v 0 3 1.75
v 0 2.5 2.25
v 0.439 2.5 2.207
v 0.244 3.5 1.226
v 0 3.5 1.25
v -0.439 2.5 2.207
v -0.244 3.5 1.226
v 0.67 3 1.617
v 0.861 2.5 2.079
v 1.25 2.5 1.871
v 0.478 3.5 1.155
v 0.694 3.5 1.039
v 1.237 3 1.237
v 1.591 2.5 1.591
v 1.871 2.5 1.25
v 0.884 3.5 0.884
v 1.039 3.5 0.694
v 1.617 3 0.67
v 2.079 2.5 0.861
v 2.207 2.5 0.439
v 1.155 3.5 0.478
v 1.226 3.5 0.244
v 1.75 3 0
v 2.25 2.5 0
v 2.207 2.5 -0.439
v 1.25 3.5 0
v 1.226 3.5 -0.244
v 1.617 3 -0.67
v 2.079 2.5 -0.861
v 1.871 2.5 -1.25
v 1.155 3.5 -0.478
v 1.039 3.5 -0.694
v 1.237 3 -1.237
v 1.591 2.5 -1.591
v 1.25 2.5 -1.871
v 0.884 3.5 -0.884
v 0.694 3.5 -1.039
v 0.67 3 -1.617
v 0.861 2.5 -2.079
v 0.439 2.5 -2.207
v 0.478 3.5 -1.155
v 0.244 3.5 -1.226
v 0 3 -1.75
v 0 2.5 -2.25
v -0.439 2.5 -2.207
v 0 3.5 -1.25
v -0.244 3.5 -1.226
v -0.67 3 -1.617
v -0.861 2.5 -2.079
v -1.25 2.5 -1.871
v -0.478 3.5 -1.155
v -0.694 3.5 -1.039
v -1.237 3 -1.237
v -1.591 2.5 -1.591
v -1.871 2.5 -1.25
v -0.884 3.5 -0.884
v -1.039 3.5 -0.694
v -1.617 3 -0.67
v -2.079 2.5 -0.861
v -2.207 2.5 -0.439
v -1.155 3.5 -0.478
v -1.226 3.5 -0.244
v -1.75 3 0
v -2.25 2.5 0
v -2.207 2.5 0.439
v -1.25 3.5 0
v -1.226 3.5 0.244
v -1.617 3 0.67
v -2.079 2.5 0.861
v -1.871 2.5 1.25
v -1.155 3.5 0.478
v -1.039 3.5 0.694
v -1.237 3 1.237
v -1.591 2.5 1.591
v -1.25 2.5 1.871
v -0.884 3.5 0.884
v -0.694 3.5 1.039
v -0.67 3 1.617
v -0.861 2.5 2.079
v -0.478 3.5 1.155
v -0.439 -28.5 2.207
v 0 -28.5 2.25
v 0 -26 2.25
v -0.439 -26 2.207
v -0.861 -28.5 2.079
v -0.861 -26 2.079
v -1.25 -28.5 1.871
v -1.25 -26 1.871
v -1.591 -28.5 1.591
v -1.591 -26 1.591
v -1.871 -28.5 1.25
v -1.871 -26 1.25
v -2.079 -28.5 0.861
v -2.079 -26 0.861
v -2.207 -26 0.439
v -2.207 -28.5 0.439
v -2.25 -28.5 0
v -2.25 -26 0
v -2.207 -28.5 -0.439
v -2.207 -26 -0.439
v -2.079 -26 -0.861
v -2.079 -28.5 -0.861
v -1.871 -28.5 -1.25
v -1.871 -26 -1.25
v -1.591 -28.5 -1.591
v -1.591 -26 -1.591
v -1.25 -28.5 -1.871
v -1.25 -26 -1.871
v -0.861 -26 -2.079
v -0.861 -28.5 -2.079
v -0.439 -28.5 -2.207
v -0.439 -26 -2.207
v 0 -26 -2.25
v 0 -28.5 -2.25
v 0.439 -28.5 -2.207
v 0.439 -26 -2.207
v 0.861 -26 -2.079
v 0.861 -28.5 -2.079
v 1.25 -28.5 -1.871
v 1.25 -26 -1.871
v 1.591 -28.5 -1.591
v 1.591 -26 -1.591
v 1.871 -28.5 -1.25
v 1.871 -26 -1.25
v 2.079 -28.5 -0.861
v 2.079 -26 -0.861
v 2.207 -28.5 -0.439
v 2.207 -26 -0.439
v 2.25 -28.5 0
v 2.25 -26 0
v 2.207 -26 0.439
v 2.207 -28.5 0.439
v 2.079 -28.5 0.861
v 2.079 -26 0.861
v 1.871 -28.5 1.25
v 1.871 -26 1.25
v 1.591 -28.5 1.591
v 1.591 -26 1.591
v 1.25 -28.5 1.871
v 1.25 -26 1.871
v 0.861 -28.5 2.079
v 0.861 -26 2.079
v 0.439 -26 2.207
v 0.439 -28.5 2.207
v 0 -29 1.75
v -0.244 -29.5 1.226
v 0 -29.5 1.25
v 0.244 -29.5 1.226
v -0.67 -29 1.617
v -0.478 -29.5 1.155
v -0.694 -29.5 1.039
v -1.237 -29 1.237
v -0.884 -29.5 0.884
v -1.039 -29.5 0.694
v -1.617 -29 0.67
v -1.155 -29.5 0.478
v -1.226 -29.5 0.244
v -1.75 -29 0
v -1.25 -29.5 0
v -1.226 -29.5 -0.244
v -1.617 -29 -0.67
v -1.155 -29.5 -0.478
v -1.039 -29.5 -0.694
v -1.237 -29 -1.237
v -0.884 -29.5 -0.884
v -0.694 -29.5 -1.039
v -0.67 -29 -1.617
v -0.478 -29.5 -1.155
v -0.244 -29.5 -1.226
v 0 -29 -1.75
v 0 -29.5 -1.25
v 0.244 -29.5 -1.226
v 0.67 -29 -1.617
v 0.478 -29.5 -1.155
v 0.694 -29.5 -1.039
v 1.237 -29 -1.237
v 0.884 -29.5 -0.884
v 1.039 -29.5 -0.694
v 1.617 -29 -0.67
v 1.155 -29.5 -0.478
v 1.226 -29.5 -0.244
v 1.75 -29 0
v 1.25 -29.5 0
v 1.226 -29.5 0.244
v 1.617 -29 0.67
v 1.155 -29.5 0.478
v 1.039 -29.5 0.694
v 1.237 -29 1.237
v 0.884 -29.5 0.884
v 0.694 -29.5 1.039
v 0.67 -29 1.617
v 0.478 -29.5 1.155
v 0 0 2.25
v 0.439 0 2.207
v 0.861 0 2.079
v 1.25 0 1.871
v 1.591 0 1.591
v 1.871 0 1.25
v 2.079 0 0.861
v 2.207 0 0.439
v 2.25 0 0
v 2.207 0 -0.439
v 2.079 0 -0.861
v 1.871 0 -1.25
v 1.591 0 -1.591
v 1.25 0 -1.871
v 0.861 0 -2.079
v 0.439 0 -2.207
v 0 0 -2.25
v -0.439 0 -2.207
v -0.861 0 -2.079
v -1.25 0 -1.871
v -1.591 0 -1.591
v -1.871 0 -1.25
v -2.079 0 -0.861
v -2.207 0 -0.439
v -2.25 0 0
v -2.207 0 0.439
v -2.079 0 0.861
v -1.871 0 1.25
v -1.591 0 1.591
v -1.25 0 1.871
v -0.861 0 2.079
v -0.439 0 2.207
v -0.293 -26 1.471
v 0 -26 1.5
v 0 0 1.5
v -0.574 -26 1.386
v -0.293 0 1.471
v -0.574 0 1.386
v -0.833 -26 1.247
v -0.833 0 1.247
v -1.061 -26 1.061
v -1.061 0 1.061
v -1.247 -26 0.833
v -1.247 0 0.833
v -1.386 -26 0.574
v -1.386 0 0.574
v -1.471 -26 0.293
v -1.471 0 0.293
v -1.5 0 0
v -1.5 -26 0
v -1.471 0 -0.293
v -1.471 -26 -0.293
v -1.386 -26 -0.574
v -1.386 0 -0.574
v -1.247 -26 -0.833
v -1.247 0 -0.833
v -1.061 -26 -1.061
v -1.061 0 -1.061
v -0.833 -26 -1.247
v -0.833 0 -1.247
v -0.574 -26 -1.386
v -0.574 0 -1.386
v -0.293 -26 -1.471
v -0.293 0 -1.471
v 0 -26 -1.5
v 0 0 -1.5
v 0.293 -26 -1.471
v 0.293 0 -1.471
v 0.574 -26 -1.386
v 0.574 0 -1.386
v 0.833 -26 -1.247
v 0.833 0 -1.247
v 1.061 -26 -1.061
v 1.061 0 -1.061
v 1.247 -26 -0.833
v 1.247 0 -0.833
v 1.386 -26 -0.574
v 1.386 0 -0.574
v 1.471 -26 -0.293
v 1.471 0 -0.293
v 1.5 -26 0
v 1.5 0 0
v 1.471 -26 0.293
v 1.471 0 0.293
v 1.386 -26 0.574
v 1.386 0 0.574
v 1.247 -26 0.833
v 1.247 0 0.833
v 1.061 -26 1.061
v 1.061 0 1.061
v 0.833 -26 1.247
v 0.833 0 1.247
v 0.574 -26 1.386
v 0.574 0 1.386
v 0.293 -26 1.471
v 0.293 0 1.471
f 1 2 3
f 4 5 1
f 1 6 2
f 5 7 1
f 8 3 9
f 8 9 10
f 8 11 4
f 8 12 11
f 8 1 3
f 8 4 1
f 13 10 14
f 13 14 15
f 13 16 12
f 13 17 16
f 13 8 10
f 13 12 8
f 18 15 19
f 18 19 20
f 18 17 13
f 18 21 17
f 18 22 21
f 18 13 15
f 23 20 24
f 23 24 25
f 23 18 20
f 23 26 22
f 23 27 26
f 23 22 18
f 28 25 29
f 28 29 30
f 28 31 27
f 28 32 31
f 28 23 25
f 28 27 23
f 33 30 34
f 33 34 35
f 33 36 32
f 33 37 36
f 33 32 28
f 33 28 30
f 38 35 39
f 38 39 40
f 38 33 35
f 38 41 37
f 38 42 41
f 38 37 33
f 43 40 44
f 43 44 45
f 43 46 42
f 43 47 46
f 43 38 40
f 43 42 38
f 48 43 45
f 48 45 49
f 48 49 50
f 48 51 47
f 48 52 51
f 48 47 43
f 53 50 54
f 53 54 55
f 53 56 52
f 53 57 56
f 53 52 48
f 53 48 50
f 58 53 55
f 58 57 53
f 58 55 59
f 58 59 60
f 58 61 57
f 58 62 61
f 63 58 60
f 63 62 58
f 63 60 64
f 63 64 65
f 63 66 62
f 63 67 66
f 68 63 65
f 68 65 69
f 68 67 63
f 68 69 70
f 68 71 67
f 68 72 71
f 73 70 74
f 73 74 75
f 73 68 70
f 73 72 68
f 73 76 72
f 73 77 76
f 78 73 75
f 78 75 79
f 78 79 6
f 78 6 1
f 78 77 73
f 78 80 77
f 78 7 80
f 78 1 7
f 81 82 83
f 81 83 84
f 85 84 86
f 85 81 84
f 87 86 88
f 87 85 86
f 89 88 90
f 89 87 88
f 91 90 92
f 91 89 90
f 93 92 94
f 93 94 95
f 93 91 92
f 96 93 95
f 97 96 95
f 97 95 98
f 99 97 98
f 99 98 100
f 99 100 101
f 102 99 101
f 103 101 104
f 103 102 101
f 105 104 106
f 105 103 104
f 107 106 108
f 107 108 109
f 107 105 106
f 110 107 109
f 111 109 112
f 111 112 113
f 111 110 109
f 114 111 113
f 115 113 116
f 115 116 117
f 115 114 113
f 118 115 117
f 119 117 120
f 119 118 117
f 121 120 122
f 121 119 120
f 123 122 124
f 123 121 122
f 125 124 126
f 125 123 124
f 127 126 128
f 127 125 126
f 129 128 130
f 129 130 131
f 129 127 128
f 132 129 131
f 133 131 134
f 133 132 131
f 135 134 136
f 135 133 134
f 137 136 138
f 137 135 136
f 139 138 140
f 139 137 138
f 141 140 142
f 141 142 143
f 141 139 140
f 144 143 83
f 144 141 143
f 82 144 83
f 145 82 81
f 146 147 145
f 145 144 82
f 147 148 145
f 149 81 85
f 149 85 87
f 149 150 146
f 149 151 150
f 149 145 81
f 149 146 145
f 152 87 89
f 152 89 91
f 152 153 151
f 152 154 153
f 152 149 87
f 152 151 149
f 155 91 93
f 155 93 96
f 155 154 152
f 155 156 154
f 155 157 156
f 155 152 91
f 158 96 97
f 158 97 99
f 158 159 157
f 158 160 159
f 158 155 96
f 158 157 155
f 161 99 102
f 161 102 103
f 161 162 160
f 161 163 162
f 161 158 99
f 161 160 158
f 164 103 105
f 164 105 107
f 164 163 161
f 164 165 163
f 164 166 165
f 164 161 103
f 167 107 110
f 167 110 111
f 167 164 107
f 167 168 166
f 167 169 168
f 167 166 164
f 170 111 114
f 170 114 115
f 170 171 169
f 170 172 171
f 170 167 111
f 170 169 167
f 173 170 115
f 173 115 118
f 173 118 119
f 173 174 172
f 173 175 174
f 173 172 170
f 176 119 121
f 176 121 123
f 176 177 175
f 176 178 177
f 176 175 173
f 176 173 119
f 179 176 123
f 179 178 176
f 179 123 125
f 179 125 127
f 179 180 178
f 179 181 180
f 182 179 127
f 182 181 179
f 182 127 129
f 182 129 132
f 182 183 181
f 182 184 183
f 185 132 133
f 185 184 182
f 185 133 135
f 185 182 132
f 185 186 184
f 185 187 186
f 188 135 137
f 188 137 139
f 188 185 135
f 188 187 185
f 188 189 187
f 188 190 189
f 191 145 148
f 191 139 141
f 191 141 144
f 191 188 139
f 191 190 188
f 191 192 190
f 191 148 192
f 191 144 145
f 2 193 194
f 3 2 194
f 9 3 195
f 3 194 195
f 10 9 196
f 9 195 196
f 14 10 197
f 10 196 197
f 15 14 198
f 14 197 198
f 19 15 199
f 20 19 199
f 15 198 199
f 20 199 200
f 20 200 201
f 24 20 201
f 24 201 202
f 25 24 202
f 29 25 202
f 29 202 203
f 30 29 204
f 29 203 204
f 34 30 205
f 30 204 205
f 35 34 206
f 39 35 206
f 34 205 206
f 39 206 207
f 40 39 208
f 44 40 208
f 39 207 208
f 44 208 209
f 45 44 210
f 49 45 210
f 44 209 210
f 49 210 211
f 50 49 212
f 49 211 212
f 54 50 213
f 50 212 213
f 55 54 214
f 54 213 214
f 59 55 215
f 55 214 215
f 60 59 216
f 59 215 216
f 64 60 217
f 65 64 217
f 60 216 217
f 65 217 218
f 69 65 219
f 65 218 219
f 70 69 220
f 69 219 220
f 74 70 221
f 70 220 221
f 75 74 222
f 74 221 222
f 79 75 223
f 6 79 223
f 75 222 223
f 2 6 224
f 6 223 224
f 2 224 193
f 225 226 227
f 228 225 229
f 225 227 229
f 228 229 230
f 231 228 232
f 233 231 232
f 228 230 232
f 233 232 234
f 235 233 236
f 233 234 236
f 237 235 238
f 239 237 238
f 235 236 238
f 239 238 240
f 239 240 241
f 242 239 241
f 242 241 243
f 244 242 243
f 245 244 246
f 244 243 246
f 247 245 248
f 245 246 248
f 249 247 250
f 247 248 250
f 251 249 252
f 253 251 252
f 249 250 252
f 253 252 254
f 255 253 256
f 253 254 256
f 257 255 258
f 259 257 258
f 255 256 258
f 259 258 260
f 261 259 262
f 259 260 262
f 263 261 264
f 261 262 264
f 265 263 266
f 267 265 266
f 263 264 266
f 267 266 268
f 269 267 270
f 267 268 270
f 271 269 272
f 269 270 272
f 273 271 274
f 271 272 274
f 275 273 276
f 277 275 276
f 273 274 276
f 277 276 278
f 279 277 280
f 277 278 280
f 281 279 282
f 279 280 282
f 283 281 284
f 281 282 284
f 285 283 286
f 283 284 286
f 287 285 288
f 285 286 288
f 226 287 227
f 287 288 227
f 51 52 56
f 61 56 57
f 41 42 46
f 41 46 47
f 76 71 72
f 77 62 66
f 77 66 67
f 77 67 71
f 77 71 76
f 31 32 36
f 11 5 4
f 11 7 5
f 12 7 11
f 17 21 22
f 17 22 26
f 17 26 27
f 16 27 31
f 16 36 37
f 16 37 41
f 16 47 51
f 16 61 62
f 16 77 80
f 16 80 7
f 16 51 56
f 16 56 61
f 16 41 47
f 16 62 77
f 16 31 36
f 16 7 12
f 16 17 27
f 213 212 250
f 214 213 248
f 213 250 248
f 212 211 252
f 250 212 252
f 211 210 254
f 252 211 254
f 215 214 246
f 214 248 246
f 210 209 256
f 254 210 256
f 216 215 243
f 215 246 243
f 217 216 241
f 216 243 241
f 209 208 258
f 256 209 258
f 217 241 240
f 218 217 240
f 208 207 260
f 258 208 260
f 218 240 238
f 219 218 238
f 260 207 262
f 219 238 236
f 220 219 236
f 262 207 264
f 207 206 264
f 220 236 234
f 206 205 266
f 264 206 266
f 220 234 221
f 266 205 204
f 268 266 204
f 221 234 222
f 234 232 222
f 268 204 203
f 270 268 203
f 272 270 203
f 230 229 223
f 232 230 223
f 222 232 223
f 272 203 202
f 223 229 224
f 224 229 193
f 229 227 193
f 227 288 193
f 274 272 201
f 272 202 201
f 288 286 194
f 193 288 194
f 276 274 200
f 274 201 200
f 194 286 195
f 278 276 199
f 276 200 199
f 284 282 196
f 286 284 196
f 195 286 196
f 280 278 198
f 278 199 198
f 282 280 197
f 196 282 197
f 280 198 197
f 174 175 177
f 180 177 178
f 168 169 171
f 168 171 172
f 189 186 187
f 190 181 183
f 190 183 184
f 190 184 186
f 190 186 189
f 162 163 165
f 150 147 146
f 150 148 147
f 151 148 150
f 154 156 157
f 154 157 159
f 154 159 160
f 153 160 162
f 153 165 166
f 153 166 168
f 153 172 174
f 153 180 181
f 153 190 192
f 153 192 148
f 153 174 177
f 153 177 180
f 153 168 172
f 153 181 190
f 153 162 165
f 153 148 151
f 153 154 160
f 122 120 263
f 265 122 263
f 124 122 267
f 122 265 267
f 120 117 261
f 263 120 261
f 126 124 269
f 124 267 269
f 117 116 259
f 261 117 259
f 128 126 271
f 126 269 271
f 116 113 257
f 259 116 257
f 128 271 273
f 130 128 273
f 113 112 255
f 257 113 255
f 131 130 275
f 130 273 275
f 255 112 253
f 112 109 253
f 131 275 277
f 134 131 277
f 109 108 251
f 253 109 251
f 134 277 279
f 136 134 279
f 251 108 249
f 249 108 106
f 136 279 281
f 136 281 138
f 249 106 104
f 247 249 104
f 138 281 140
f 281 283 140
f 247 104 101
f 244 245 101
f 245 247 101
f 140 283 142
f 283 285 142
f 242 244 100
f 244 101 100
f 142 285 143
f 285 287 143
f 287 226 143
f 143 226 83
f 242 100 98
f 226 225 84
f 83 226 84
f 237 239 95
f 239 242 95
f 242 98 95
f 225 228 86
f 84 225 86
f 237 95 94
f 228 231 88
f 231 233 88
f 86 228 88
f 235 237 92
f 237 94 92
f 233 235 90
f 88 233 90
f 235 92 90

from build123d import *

# Parameters (mm, degrees)
SKETCH1_R           = 2.25
BOSS_EXTRUDE1_DEPTH = 3.5
SKETCH2_R           = 1.5
BOSS_EXTRUDE2_DEPTH = 26
BOSS_EXTRUDE3_START = 3.5
SKETCH3_R           = 2.25
BOSS_EXTRUDE3_DEPTH = 3.5
CHAMFER1_SIZE       = 1


with BuildPart() as part:
    # Sketch1 → Boss-Extrude1 (new body)
    with BuildSketch(Plane(origin=(0, 0, 0), x_dir=(1, 0, 0), z_dir=(0, 1, 0))):
        with Locations(Location((0, 0, 0), (0, 0, 270))):
            Circle(SKETCH1_R)
    extrude(amount=BOSS_EXTRUDE1_DEPTH)

    # Sketch2 → Boss-Extrude2 (add)
    with BuildSketch(Plane.XZ):
        with Locations(Location((0, 0, 0), (0, 0, 90))):
            Circle(SKETCH2_R)
    extrude(amount=BOSS_EXTRUDE2_DEPTH)

    # Sketch3 → Boss-Extrude3 (add)
    with BuildSketch(Plane.XZ.offset(26).offset(BOSS_EXTRUDE3_START)):
        with Locations(Location((0, 0, 0), (0, 0, 90))):
            Circle(SKETCH3_R)
    extrude(amount=-BOSS_EXTRUDE3_DEPTH)

    # Chamfer1
    chamfer1_edges = [part.edges().sort_by_distance(p)[0] for p in [
        (0, -29.5, -2.25),
        (0, 3.5, -2.25),
    ]]
    chamfer(chamfer1_edges, length=CHAMFER1_SIZE)


solid = part.part
